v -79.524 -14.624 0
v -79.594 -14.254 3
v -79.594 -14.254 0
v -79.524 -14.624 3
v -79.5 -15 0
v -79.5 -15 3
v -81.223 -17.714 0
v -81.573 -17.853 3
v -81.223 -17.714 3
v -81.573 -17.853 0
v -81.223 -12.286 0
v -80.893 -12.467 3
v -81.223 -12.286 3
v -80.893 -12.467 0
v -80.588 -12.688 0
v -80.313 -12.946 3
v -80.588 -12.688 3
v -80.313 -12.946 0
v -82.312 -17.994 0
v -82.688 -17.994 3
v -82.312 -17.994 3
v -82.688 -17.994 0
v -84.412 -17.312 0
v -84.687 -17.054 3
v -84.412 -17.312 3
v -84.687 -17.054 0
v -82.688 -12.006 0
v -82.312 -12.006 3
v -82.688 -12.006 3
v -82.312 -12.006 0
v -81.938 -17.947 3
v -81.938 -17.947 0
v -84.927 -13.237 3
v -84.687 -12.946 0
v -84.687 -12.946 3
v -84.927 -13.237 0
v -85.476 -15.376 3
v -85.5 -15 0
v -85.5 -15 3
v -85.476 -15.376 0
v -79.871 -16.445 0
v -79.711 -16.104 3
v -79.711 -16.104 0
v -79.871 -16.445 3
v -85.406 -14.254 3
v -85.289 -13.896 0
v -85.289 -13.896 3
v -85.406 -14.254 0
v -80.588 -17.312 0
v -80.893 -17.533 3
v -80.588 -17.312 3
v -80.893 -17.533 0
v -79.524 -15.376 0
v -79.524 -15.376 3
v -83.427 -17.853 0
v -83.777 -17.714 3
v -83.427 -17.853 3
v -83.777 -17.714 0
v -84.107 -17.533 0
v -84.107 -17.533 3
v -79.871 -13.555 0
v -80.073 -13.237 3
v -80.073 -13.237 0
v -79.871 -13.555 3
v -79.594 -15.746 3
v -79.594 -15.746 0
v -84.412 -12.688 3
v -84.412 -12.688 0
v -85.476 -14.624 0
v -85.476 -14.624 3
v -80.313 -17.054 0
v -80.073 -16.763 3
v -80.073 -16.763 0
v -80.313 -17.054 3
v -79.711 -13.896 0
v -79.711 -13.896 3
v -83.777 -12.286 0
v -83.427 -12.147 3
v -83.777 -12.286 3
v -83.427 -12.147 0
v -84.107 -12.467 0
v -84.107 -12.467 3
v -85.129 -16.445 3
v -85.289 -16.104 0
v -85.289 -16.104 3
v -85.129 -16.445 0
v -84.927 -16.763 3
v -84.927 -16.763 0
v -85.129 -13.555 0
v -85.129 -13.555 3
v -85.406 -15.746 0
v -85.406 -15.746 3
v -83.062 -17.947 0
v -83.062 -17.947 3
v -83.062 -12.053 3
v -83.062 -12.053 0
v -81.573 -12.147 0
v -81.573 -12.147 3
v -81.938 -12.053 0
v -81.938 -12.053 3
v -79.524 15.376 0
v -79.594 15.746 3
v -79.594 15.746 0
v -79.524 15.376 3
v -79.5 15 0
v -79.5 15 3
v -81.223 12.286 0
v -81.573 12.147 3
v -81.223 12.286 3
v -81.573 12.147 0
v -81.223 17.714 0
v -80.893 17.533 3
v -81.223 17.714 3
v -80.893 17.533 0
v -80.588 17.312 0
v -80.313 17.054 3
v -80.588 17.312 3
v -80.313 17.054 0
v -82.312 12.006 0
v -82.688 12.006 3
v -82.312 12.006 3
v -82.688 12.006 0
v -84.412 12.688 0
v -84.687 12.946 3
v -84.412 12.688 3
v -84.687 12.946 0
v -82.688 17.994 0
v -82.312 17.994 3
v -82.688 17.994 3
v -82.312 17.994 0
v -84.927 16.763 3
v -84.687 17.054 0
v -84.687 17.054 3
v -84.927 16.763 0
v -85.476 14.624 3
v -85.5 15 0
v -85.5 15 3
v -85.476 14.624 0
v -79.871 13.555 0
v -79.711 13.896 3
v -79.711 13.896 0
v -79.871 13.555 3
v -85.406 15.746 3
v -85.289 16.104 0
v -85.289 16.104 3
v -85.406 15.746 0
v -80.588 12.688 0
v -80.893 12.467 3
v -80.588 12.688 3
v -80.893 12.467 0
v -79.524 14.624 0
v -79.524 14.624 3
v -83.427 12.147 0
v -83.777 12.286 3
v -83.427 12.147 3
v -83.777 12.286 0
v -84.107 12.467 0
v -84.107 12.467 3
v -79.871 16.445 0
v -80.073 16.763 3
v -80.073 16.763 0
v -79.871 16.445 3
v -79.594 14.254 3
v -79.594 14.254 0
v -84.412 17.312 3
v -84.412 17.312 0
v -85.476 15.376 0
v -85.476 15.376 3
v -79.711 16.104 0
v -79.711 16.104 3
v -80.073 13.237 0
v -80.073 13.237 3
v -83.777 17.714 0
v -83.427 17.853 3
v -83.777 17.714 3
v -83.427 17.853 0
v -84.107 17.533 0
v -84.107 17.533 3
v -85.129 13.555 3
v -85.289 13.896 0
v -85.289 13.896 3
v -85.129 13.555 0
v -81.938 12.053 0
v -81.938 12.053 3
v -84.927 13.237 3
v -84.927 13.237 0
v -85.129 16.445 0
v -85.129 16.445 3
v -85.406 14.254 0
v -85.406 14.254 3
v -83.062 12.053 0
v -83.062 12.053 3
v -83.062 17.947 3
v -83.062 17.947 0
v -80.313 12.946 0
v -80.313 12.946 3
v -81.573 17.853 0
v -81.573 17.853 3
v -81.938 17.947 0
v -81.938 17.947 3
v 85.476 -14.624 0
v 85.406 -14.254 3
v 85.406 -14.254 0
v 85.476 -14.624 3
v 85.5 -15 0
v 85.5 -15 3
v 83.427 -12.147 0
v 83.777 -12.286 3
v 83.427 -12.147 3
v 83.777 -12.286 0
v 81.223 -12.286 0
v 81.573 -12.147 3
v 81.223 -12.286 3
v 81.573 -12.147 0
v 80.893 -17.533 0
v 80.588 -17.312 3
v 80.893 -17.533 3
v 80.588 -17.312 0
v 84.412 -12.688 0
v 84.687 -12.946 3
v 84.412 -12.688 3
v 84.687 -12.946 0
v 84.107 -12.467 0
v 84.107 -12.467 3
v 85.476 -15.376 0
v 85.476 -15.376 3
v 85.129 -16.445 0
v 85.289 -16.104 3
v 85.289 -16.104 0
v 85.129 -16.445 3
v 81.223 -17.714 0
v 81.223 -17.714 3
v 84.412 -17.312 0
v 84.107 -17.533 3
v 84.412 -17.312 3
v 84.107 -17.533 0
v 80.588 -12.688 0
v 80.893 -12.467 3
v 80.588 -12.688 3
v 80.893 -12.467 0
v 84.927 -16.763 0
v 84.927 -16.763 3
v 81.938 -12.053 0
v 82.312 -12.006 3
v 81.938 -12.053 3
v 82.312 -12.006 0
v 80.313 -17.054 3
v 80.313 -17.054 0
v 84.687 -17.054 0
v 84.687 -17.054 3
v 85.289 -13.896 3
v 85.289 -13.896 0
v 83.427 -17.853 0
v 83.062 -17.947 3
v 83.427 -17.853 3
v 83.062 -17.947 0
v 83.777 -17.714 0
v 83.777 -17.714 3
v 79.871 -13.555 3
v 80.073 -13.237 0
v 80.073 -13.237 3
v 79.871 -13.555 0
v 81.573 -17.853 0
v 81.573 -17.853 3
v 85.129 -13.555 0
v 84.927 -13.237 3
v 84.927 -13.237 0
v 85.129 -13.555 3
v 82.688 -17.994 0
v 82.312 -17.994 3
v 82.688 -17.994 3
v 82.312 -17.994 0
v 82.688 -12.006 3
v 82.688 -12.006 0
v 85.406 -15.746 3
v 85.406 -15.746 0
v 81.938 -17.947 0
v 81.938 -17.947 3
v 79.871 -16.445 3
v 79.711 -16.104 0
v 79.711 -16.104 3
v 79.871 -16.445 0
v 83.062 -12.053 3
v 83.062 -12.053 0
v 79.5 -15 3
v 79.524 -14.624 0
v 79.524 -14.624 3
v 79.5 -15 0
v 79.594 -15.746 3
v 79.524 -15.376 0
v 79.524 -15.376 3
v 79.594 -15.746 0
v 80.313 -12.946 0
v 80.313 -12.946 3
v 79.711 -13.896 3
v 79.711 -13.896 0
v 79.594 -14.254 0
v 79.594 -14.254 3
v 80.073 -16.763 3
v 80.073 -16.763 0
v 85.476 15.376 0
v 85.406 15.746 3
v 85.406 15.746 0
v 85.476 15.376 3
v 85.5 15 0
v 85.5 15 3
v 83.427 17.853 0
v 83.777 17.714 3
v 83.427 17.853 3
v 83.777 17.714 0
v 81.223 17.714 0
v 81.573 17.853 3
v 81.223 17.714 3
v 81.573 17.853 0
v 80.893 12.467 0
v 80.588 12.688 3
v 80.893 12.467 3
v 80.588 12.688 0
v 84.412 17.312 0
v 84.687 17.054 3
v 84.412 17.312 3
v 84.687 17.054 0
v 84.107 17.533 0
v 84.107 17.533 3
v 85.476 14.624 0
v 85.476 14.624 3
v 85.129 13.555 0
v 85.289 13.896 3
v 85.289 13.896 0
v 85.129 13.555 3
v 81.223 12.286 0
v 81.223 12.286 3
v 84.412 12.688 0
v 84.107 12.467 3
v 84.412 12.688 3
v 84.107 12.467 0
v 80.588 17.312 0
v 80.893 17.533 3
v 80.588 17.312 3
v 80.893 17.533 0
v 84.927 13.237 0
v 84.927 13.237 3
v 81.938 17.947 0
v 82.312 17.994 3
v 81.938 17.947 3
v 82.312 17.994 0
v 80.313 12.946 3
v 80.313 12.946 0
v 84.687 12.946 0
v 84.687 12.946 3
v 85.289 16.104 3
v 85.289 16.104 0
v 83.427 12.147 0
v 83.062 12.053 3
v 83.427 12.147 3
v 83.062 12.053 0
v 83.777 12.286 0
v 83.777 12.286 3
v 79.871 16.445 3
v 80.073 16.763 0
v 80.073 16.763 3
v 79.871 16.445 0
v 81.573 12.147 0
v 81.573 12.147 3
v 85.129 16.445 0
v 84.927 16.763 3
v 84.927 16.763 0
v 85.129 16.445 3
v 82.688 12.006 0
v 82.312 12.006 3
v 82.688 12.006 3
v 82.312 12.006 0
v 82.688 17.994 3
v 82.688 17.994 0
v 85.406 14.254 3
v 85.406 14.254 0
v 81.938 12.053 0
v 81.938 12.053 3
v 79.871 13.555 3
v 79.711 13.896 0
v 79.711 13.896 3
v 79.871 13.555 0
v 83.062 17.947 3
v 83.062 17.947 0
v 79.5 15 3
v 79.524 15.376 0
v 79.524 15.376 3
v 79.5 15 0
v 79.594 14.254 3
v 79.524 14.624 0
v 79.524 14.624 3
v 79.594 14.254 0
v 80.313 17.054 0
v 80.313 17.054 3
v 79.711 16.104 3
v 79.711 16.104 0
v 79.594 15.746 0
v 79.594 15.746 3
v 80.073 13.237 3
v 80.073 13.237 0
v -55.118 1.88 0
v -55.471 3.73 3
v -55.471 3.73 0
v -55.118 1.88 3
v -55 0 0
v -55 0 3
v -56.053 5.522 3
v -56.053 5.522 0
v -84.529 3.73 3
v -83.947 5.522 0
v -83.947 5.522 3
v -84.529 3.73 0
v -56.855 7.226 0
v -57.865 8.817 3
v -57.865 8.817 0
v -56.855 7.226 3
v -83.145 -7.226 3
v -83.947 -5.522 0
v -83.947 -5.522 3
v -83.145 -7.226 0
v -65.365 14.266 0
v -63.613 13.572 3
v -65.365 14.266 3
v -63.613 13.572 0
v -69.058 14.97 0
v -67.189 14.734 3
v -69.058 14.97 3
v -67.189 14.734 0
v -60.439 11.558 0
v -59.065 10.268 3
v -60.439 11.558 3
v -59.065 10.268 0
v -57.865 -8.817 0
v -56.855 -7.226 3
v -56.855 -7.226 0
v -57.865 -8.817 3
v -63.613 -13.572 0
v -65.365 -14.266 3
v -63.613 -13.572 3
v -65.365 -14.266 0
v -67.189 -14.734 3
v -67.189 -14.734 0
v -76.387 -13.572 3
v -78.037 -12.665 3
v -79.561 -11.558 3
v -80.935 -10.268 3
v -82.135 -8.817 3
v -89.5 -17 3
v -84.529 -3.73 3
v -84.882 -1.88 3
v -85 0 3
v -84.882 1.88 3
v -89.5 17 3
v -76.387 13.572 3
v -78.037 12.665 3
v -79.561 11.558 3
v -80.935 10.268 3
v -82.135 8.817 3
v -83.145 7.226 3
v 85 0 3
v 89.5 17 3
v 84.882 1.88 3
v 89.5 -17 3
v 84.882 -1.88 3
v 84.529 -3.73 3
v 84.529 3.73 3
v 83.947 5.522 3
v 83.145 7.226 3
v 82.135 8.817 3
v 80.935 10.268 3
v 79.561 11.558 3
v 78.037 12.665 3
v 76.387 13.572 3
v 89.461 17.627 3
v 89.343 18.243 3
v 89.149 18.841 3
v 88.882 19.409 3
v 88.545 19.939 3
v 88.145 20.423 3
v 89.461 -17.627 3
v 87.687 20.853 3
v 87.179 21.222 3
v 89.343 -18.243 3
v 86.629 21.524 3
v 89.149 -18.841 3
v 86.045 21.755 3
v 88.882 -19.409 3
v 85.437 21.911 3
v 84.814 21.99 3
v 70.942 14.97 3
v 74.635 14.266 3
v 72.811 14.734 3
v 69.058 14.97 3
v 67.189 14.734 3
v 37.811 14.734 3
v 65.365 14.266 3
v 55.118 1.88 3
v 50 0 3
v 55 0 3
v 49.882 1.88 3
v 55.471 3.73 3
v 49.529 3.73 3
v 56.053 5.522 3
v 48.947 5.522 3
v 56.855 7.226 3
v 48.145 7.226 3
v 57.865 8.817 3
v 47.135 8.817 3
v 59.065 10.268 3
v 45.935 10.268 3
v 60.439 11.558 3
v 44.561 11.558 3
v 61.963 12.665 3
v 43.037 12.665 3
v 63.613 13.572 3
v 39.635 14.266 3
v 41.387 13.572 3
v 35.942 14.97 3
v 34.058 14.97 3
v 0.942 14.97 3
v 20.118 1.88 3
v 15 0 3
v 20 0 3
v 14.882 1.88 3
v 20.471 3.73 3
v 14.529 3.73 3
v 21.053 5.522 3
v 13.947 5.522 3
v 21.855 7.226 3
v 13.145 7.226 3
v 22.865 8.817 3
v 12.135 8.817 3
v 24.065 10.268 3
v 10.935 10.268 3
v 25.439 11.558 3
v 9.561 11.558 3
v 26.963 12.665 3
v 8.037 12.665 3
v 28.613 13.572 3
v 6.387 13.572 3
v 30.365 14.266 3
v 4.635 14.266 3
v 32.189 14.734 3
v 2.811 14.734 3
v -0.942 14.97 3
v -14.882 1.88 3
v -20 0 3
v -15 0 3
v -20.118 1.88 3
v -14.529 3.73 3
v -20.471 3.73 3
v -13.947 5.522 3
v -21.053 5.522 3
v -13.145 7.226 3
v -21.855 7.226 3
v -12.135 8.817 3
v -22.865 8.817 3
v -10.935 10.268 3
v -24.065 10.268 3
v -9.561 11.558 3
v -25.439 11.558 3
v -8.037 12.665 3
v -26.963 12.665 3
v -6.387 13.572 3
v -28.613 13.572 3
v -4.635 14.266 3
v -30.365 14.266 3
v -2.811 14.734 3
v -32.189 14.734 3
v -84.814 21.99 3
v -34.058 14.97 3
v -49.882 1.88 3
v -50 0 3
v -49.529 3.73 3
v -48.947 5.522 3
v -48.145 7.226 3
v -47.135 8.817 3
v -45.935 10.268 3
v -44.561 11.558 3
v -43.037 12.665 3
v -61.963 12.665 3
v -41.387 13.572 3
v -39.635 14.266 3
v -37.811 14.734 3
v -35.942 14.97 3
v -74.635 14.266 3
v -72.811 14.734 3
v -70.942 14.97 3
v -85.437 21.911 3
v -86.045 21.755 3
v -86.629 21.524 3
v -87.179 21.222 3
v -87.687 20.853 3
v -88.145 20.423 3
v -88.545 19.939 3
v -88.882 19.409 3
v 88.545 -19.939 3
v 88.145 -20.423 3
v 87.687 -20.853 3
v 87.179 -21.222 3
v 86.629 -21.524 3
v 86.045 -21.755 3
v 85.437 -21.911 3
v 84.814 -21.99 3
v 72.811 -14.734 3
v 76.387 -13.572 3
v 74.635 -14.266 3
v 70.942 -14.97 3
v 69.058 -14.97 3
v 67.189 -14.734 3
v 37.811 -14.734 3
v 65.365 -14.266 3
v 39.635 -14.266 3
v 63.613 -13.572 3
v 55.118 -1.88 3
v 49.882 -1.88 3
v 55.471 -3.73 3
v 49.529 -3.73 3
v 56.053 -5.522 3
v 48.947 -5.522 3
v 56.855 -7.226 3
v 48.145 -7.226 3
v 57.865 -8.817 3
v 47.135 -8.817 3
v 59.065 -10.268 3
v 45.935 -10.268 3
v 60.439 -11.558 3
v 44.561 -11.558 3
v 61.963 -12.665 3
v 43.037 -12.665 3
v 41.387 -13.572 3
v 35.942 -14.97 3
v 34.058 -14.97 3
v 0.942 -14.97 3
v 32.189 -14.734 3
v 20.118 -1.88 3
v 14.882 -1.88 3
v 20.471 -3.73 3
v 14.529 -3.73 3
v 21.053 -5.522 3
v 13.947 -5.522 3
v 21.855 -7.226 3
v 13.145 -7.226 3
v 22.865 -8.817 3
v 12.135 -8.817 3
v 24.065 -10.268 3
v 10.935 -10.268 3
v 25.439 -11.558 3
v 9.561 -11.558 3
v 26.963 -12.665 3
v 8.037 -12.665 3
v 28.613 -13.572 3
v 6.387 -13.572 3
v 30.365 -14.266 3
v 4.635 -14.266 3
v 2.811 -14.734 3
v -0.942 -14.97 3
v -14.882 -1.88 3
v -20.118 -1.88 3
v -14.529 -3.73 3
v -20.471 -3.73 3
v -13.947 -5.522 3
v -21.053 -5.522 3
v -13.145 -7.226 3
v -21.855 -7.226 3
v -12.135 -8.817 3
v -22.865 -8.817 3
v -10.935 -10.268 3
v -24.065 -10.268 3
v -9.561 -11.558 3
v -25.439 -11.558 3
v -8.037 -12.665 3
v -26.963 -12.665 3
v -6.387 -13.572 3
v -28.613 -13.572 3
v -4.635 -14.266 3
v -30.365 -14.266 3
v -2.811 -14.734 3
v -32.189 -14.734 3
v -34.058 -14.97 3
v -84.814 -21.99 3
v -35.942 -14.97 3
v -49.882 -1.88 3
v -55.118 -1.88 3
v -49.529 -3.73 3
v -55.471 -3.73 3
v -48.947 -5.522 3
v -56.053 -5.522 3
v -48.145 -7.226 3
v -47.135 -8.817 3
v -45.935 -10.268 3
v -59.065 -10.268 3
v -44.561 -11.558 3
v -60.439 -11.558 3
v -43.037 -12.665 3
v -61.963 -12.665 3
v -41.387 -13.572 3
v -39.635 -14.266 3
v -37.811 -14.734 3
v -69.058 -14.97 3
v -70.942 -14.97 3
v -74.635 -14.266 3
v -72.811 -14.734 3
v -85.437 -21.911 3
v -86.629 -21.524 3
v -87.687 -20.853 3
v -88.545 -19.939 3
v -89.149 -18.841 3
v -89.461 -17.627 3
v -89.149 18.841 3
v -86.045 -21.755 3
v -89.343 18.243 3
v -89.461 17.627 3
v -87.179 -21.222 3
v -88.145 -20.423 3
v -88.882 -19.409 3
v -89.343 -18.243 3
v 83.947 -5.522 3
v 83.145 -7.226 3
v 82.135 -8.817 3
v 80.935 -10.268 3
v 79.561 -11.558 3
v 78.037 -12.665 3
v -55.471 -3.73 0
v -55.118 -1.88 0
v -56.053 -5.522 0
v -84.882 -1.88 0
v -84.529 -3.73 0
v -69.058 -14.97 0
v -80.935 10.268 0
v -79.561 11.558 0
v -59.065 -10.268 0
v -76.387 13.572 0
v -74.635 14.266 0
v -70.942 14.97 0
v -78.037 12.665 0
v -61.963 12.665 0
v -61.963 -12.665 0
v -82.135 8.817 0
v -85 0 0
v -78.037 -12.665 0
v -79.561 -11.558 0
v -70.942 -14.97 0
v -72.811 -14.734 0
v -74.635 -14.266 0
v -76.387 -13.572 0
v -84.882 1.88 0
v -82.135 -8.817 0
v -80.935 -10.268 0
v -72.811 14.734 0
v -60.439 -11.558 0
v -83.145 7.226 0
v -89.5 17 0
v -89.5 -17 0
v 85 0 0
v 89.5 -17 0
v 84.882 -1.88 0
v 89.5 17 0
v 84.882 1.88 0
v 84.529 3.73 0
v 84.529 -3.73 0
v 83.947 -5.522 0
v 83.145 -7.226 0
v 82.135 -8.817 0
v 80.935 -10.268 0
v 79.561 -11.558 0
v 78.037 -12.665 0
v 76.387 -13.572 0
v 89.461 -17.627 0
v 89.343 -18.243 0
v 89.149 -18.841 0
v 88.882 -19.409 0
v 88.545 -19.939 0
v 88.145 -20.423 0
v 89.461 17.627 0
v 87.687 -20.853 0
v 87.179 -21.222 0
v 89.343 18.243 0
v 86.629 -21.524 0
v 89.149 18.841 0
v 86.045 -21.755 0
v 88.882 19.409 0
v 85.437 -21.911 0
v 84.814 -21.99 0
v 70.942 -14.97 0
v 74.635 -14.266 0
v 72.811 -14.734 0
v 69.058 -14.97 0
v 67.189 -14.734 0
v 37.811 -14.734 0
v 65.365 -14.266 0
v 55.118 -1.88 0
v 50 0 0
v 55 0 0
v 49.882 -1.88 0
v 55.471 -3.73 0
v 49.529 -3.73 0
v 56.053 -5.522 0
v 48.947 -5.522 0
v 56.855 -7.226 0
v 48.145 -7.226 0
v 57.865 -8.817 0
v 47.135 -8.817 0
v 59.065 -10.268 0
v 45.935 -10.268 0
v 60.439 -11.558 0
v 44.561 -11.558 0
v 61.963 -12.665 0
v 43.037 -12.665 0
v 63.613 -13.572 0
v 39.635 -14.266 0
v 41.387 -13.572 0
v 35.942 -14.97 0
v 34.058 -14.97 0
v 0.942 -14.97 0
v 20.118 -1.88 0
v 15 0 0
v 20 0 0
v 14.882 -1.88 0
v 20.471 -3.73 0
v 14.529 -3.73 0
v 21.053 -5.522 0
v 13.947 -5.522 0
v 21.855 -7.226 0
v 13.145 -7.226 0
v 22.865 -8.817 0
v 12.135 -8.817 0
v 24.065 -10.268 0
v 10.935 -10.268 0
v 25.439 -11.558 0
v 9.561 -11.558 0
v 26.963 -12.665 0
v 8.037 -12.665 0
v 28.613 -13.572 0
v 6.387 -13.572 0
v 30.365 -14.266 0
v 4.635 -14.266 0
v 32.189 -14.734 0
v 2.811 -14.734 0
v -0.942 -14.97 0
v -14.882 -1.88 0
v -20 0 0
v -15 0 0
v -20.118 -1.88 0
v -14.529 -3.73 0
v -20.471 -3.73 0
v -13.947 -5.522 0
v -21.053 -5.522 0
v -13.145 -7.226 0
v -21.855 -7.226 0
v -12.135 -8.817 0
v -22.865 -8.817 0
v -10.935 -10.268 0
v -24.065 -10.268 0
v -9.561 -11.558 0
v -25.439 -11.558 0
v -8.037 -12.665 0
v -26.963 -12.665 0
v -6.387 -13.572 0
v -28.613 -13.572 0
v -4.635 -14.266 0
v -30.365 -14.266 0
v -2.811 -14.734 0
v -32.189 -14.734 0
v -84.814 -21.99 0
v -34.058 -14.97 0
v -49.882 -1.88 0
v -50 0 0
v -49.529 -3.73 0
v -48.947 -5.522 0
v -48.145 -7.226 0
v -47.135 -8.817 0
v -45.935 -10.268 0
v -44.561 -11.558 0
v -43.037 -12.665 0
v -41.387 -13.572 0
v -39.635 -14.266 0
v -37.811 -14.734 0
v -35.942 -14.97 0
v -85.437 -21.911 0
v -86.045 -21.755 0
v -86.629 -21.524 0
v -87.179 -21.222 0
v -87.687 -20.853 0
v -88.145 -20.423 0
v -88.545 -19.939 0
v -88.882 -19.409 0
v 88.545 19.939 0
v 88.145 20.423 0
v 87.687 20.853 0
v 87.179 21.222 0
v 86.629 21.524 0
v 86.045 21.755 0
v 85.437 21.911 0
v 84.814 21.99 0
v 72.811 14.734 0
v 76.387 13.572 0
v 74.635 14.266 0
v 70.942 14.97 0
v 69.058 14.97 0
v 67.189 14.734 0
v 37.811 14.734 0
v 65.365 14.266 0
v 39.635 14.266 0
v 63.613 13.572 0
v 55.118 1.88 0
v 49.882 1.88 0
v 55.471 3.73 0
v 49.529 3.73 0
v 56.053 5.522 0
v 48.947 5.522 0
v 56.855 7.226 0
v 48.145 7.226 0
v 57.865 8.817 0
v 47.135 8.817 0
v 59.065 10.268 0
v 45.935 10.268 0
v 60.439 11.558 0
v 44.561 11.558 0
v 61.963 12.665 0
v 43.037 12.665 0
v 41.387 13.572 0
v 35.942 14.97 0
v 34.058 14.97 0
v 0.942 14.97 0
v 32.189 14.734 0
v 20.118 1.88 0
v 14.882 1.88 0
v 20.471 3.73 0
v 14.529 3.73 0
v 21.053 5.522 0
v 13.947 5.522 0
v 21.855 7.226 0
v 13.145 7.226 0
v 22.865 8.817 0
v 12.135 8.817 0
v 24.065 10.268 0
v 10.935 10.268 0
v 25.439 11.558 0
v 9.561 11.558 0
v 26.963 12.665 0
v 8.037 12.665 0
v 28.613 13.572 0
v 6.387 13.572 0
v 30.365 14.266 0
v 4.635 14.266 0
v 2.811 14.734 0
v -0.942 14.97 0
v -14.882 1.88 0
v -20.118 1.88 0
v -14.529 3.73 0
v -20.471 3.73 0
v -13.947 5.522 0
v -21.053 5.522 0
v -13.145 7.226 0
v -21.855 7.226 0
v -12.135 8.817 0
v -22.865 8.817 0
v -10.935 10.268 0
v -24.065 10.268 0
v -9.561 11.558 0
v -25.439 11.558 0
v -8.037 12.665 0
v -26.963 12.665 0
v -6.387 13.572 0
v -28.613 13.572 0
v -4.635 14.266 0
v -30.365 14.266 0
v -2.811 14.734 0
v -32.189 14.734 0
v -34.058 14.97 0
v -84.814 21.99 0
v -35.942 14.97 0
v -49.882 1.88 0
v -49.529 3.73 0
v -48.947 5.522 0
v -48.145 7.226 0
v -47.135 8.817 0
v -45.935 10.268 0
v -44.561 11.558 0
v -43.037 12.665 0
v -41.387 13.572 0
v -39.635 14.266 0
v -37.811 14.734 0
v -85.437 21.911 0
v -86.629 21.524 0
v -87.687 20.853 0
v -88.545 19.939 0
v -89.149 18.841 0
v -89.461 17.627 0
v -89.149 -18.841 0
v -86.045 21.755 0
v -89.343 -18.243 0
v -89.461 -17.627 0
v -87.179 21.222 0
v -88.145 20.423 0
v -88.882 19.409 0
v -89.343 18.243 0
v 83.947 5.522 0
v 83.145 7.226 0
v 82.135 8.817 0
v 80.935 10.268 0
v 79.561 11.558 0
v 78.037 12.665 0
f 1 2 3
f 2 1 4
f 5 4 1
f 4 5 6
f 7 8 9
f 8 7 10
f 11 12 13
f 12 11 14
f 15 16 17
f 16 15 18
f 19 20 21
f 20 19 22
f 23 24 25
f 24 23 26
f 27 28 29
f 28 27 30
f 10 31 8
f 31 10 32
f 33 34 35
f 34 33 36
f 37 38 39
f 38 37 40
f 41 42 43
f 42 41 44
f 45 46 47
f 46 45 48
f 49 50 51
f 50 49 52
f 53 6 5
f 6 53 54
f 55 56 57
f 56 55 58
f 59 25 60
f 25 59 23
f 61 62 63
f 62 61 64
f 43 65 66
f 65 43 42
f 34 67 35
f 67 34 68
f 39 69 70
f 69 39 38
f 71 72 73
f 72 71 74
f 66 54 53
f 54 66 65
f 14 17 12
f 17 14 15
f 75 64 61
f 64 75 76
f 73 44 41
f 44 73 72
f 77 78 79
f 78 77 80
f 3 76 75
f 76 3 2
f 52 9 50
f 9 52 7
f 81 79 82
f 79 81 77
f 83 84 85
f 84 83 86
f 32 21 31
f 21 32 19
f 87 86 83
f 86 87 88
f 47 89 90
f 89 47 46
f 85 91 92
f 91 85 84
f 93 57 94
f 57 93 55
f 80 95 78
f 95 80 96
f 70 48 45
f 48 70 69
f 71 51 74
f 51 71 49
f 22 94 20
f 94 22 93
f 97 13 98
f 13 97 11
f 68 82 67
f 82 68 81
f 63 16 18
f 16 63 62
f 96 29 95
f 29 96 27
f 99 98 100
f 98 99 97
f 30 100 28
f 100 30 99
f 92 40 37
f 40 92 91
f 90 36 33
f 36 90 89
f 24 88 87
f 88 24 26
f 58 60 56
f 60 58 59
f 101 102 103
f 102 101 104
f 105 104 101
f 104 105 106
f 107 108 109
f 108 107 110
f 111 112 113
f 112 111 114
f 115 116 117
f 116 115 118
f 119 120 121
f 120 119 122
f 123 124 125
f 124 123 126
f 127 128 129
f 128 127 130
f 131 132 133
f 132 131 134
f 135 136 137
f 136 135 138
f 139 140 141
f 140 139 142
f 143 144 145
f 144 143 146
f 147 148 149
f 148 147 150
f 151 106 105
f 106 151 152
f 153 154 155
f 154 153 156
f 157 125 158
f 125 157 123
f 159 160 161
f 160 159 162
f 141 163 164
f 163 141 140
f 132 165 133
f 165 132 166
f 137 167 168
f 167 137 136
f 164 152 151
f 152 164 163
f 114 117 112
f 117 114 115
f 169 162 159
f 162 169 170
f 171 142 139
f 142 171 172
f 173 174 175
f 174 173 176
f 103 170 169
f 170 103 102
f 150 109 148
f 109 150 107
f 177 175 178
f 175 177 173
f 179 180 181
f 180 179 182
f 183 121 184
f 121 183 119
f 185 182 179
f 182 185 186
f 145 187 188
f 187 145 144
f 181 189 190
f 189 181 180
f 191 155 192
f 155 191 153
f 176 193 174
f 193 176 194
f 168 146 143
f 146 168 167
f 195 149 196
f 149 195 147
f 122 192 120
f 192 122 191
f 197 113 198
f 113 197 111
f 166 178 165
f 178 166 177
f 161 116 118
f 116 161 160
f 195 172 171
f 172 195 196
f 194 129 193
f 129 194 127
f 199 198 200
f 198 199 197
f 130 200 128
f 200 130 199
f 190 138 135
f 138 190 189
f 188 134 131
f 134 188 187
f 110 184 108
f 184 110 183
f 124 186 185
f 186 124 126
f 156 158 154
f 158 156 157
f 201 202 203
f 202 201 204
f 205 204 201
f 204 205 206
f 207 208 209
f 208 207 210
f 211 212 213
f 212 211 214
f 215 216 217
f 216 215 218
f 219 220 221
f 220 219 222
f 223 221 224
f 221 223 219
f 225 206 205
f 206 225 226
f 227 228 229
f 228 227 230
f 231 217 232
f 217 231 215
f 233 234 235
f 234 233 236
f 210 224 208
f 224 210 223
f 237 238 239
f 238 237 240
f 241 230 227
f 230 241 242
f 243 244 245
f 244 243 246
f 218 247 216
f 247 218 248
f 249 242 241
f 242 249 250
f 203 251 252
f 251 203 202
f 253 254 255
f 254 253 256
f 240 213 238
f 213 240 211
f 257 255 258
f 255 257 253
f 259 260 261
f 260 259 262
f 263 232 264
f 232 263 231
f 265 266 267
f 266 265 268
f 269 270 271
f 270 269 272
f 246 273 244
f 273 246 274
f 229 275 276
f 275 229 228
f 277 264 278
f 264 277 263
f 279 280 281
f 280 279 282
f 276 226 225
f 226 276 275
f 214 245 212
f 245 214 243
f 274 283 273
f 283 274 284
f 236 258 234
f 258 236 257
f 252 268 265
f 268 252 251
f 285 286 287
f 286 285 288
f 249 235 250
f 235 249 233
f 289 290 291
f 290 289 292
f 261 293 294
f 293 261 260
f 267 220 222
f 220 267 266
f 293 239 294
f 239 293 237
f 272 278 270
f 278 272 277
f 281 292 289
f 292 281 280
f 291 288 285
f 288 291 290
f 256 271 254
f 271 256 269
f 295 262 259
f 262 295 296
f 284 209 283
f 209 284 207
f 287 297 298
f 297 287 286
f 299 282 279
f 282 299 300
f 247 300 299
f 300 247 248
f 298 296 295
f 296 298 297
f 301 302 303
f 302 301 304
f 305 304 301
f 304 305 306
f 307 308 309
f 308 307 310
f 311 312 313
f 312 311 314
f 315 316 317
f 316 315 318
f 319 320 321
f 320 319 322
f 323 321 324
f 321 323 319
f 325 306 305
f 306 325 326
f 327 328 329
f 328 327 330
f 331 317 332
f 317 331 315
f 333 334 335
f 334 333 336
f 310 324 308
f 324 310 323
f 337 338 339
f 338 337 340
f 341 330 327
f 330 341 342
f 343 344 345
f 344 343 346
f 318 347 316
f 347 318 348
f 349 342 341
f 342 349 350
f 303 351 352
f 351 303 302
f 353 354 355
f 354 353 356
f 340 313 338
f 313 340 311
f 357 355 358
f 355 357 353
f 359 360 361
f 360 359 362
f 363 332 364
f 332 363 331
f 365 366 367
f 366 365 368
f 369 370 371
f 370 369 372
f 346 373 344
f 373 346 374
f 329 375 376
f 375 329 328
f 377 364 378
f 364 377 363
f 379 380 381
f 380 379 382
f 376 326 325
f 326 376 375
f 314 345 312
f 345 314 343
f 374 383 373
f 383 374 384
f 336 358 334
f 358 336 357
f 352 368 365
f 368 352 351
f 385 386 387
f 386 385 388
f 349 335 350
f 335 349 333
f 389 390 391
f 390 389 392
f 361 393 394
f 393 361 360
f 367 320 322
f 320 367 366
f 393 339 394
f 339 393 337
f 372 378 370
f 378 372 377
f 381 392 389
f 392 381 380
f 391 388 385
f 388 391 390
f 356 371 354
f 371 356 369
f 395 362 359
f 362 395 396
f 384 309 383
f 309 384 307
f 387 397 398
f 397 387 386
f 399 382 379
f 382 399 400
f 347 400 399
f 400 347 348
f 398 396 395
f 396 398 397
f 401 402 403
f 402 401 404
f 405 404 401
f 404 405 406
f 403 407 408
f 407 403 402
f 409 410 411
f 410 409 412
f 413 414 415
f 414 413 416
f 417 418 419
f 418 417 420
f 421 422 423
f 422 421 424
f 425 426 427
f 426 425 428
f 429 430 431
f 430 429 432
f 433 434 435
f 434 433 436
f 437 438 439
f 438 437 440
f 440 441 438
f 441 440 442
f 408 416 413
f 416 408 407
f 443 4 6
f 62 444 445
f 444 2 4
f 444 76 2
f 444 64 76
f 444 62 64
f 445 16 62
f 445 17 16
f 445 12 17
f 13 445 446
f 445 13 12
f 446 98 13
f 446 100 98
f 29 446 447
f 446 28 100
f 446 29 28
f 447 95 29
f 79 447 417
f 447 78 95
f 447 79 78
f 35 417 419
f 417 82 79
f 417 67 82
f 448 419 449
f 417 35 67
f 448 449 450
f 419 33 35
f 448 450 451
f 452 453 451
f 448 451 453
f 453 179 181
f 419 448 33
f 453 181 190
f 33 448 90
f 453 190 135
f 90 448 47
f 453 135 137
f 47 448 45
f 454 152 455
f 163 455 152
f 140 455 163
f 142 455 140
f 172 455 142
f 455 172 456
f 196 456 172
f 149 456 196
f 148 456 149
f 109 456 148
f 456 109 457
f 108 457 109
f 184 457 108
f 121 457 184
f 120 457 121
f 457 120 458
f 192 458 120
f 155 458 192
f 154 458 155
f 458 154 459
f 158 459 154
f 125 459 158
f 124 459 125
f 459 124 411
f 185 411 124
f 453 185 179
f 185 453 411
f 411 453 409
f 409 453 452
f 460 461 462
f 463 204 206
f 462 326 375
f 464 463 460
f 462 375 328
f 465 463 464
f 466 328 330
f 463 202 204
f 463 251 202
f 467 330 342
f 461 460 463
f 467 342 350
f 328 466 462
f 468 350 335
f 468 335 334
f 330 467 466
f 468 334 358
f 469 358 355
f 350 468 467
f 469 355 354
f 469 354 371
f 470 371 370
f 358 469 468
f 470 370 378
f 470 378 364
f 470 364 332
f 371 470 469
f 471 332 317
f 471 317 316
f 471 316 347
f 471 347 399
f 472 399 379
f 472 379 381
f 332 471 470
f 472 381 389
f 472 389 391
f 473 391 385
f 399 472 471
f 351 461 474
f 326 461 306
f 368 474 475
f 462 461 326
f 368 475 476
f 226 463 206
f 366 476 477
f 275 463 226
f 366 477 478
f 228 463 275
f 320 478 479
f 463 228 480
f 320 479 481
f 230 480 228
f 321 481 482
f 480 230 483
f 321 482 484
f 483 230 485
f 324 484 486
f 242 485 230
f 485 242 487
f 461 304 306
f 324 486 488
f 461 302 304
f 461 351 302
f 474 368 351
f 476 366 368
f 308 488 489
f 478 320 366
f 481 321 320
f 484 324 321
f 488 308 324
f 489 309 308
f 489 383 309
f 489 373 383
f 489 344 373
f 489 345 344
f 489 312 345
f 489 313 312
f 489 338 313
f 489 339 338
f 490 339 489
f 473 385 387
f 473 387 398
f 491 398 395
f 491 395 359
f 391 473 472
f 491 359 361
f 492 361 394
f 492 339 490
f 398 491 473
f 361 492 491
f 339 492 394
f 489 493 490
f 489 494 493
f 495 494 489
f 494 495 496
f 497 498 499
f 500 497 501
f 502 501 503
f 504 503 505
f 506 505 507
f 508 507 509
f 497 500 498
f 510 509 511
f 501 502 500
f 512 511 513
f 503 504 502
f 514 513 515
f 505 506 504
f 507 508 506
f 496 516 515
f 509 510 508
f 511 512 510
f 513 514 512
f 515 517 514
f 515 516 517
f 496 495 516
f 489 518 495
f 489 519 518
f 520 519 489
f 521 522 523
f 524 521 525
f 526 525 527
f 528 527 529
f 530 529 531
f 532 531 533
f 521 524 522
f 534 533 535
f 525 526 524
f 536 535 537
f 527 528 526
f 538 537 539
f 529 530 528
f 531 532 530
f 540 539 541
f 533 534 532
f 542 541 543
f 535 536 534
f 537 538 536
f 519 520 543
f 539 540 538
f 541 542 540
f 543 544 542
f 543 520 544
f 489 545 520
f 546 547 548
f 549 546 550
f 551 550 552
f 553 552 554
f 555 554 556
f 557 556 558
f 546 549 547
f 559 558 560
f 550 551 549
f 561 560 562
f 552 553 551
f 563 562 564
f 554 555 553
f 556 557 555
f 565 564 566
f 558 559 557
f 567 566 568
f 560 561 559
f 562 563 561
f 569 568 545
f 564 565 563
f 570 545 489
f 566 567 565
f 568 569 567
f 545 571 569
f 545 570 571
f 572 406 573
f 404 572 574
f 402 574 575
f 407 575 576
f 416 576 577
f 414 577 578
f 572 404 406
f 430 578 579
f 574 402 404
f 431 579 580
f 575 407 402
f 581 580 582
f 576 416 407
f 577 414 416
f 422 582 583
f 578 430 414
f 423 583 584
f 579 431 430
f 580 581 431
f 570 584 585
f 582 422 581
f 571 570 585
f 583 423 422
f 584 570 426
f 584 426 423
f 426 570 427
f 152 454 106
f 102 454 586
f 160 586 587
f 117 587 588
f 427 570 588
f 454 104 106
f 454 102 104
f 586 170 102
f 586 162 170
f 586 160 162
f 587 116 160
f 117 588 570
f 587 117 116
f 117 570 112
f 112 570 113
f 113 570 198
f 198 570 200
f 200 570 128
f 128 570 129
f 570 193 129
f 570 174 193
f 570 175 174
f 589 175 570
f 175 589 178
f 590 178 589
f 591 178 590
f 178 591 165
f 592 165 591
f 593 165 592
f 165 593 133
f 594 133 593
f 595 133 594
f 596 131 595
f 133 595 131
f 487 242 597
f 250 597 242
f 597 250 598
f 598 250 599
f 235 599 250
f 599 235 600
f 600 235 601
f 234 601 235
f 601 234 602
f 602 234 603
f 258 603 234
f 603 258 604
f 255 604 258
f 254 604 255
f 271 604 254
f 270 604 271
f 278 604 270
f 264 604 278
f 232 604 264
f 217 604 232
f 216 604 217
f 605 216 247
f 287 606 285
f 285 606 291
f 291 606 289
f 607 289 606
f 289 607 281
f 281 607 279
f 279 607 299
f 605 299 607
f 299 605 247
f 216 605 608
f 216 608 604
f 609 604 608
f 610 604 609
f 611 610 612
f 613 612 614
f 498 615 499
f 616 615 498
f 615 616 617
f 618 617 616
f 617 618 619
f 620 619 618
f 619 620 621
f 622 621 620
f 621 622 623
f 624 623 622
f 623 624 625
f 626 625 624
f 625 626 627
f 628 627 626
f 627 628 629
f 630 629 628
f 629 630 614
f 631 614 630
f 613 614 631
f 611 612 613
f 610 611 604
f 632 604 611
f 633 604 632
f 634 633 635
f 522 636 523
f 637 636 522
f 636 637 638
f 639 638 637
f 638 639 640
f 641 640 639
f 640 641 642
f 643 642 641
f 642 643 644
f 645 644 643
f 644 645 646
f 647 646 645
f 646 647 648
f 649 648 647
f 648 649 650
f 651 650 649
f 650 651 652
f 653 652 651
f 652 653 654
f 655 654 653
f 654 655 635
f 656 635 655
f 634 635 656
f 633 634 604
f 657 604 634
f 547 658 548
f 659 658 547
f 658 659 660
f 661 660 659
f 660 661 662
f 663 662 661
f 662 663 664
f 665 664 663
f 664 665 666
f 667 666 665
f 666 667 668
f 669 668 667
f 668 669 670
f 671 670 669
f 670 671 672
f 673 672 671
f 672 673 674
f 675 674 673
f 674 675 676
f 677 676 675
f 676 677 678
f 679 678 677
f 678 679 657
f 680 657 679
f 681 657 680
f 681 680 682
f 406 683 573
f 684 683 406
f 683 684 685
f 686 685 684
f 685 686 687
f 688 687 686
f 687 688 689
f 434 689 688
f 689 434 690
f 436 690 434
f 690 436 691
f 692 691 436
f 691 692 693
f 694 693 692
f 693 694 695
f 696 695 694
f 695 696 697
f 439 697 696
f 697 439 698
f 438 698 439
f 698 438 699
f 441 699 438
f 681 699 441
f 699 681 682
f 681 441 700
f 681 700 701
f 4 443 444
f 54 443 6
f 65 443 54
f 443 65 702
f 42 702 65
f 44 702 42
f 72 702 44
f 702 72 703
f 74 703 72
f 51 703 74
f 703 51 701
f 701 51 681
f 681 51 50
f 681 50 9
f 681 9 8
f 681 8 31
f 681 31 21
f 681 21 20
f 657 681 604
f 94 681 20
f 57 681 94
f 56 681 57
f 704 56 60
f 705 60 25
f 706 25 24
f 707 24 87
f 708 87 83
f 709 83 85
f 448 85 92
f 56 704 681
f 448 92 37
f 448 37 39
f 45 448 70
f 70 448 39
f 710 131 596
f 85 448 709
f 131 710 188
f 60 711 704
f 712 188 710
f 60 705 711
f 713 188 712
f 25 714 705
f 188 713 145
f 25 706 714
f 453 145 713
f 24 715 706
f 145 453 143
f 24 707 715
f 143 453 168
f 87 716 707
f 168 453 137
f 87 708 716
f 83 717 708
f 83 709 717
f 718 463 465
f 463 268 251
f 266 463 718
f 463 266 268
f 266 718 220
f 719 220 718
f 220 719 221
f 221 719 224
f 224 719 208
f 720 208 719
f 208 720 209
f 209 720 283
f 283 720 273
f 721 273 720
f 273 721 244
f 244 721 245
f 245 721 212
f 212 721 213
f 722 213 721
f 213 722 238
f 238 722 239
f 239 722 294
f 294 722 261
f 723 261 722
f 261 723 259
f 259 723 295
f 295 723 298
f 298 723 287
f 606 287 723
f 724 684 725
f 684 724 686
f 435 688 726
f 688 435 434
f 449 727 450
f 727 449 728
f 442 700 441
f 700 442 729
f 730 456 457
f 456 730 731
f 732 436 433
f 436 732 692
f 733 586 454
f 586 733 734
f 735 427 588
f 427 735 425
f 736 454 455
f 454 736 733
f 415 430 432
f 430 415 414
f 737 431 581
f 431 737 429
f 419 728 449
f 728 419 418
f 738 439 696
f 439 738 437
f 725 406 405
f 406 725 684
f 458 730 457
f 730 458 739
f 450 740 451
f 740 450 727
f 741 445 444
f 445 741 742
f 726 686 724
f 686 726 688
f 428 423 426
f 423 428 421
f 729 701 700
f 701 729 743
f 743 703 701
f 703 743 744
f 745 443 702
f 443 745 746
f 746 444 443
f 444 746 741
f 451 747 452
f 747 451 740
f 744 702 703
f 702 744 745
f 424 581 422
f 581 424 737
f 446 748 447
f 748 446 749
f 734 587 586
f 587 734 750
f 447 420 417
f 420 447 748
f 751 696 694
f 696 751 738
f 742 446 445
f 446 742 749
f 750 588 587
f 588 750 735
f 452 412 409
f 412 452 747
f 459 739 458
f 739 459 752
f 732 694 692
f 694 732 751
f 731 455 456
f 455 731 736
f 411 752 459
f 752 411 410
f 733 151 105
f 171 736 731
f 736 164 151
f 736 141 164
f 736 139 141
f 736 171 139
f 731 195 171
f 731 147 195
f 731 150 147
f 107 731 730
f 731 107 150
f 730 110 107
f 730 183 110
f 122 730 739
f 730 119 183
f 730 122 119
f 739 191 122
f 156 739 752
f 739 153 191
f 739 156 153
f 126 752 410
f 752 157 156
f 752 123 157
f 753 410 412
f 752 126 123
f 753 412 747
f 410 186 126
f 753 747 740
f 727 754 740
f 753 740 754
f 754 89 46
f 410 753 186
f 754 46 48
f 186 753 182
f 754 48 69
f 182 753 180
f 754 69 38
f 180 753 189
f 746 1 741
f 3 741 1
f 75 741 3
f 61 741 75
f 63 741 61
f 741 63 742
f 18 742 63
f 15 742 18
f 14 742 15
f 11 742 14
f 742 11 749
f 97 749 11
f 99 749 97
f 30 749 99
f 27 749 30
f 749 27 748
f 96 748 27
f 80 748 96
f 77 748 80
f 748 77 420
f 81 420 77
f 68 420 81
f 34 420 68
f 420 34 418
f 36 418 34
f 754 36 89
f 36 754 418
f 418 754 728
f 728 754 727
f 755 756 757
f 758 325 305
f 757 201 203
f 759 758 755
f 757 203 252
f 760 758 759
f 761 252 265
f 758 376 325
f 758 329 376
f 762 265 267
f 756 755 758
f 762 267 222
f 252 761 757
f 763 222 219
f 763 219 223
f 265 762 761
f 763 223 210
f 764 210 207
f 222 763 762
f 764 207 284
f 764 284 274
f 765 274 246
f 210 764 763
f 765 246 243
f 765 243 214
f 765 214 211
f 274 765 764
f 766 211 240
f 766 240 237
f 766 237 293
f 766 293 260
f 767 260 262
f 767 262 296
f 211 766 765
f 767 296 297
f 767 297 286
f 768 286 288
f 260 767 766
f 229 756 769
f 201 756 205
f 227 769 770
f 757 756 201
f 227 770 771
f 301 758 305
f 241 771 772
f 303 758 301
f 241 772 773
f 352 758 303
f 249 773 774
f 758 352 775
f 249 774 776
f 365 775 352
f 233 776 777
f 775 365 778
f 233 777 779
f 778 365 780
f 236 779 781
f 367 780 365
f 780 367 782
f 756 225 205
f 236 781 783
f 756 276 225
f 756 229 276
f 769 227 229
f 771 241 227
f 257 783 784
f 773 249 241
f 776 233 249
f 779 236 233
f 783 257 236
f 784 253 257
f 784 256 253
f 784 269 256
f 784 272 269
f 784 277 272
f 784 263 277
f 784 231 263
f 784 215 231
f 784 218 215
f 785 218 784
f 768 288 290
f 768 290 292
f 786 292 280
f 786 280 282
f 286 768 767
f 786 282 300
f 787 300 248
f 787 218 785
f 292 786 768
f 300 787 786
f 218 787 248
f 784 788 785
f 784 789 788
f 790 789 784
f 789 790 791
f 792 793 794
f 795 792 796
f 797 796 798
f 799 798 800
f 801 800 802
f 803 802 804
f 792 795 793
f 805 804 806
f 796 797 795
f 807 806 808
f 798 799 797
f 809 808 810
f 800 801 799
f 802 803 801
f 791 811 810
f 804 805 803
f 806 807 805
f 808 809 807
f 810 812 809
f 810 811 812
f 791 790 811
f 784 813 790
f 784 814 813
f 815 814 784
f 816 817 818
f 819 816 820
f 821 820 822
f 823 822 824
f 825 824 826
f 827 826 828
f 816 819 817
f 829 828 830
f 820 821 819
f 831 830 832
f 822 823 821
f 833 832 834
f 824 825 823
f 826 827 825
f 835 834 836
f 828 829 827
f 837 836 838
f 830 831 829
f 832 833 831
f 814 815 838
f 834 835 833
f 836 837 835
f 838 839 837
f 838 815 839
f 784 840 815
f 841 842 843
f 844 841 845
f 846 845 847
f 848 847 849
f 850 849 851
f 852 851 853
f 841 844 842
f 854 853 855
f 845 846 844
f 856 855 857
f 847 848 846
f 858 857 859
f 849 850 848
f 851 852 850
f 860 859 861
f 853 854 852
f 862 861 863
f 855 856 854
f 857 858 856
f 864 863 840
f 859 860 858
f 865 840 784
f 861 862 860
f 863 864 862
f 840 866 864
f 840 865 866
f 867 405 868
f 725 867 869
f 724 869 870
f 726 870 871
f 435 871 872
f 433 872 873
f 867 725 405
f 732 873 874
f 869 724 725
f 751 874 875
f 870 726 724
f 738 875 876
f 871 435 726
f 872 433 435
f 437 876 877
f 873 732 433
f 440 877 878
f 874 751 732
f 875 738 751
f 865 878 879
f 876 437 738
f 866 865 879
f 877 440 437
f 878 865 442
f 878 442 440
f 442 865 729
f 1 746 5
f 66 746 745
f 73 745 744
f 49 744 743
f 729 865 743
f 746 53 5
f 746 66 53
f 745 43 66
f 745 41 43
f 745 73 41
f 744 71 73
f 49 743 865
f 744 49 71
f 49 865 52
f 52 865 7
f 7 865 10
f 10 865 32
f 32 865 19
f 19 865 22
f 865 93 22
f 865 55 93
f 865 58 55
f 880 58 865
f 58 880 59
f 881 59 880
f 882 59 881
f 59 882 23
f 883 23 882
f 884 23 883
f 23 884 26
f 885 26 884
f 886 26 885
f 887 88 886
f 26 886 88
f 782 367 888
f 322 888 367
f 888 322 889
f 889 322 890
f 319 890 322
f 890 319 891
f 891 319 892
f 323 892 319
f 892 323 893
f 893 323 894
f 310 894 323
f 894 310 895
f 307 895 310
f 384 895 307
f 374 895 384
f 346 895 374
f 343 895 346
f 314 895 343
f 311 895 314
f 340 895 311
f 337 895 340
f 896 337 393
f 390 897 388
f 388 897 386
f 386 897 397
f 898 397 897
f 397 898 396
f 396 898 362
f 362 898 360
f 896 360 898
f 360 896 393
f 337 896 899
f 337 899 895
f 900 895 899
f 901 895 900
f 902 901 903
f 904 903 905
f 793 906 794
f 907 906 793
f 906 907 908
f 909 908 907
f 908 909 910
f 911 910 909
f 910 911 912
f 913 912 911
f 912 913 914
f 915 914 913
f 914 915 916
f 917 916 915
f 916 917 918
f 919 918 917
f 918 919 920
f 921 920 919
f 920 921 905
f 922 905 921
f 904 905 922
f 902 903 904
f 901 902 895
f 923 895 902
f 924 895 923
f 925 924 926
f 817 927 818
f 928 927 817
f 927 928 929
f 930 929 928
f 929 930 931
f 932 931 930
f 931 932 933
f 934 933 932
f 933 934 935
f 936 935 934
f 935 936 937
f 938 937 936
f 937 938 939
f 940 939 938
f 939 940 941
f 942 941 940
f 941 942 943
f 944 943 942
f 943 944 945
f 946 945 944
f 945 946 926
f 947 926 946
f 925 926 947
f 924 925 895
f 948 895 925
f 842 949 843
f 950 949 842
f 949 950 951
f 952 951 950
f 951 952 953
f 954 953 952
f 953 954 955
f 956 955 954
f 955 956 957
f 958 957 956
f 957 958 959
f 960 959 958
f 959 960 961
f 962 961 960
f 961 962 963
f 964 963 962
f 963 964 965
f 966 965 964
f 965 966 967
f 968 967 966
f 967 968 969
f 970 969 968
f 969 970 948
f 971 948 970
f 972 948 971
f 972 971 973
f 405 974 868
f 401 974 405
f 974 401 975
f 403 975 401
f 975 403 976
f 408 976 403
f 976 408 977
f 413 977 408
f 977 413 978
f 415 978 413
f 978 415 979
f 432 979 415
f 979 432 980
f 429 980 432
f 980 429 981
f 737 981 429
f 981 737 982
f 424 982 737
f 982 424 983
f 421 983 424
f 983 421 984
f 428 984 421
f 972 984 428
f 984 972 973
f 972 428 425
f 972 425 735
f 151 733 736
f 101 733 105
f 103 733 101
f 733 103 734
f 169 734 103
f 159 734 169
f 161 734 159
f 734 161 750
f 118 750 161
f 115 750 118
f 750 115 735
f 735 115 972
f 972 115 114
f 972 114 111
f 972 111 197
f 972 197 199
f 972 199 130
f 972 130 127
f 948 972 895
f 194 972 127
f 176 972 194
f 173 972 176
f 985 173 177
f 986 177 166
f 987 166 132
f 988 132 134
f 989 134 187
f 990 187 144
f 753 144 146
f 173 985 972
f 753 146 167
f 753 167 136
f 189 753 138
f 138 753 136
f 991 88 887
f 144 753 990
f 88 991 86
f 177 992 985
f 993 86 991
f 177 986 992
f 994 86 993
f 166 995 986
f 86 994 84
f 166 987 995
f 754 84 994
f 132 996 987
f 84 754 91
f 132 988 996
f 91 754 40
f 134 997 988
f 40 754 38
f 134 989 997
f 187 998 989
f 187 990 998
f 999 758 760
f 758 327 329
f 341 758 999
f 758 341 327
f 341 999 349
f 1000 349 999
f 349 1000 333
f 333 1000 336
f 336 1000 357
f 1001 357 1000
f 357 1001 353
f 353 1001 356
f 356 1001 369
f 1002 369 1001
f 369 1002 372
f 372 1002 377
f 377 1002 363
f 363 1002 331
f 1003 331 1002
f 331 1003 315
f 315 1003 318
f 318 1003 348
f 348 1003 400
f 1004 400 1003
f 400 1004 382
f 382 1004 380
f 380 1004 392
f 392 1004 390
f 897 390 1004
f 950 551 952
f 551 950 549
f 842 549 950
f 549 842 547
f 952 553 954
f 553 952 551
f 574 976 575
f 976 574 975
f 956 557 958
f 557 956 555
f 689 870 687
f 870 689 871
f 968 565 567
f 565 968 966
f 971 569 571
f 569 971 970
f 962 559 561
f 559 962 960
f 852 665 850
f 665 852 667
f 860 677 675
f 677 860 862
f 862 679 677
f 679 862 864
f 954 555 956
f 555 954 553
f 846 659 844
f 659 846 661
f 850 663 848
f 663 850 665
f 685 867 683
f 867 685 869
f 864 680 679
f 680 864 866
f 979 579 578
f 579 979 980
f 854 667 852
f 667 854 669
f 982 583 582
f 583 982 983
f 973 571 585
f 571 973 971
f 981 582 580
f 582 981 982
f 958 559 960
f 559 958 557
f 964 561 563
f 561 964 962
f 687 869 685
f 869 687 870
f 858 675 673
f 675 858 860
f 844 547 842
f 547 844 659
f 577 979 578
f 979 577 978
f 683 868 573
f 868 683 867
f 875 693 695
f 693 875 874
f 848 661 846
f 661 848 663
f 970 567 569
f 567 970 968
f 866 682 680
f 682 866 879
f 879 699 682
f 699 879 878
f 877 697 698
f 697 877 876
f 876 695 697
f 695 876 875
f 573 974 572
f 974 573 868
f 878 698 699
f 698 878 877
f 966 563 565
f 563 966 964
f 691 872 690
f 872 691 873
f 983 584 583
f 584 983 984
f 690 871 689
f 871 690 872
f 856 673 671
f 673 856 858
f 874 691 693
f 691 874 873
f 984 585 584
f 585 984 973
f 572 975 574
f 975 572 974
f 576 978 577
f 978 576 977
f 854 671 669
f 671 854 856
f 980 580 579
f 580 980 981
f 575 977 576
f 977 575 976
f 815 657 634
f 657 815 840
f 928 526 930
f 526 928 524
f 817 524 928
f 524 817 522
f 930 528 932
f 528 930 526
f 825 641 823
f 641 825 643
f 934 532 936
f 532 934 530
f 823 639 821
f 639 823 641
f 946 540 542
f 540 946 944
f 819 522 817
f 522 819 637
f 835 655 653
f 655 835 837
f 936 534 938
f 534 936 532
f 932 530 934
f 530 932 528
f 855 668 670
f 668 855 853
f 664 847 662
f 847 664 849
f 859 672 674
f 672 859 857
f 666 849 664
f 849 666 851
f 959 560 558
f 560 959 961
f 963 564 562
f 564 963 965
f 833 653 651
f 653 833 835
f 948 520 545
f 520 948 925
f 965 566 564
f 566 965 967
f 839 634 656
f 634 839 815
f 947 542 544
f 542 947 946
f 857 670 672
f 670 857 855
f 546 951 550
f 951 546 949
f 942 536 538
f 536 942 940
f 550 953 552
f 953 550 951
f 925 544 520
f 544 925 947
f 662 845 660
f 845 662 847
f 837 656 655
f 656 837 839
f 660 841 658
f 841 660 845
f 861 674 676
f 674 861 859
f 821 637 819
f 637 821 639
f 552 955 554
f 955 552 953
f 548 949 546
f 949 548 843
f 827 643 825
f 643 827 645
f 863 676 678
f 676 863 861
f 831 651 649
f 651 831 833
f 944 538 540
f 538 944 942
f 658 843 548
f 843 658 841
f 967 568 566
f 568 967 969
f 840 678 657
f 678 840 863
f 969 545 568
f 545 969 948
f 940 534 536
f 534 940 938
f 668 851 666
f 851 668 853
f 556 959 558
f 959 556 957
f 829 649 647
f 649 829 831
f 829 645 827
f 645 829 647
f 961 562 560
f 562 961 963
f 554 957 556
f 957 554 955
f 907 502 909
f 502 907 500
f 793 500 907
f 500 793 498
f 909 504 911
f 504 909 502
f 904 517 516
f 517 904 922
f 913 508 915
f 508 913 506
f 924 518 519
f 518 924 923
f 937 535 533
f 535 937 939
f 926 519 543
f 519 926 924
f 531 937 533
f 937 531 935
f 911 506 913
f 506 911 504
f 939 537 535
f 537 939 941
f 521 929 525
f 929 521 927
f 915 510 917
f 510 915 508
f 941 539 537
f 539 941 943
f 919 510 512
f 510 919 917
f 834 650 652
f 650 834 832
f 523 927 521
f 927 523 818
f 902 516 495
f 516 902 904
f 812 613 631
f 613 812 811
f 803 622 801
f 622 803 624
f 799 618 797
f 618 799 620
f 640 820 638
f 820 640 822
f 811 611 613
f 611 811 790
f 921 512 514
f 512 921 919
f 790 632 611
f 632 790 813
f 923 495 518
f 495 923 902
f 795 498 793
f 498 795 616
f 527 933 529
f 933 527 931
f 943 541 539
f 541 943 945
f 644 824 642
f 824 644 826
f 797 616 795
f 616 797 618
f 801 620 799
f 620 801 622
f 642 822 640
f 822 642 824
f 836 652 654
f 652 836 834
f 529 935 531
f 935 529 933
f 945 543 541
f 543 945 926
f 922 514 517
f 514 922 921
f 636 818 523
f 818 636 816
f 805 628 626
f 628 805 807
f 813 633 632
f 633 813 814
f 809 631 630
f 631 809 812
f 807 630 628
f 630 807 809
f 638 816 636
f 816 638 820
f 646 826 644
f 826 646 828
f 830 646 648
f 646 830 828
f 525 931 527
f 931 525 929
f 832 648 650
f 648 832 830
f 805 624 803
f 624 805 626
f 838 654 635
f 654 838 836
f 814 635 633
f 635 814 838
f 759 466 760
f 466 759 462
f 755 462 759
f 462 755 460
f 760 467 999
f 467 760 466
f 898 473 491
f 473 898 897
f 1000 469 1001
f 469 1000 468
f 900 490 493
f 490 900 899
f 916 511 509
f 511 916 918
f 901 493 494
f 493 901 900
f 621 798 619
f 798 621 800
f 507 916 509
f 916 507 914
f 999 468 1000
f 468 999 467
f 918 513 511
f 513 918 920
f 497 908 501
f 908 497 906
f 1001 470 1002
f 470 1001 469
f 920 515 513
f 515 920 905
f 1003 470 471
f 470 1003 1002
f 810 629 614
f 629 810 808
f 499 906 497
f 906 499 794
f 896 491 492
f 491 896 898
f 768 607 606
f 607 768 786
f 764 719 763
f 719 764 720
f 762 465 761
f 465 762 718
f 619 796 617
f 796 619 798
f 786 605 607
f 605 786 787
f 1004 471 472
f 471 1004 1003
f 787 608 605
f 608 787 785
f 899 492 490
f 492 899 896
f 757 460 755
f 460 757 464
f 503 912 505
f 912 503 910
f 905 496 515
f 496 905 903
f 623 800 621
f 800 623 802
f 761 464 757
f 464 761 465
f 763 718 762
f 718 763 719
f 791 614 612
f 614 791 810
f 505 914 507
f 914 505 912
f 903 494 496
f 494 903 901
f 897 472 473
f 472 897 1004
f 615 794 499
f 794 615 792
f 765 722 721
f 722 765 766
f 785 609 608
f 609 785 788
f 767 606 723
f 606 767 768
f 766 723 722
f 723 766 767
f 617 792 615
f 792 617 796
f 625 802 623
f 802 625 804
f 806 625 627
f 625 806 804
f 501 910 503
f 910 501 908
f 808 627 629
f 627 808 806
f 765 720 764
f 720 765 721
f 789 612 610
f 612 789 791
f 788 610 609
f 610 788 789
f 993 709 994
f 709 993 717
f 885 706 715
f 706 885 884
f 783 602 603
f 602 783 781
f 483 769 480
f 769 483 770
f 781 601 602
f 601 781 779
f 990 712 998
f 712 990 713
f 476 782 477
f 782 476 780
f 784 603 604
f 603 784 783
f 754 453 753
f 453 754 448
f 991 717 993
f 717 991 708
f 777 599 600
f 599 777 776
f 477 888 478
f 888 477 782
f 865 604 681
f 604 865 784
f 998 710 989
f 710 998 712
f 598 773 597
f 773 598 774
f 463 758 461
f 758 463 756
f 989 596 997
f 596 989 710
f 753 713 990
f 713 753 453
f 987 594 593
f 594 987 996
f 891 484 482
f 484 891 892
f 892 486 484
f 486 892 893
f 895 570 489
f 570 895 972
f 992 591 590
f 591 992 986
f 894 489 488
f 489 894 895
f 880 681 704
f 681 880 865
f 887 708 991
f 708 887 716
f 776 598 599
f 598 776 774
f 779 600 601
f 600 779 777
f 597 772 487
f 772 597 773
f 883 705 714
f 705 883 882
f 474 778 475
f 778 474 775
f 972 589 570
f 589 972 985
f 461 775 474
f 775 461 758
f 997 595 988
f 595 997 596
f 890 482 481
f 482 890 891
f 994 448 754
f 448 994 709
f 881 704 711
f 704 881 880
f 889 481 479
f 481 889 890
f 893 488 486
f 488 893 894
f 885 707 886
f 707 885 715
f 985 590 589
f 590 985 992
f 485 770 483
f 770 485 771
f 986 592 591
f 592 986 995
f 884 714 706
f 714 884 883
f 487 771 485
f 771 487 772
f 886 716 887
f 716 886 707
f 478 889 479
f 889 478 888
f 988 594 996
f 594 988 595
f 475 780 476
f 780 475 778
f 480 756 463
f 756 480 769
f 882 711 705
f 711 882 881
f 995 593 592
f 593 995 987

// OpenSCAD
$fn = 50;

difference() {
	union() {
		hull() {
			translate(v = [-84.5, 17.0, 0]) {
				cylinder(h = 3, r = 5);
			}
			translate(v = [84.5, 17.0, 0]) {
				cylinder(h = 3, r = 5);
			}
			translate(v = [-84.5, -17.0, 0]) {
				cylinder(h = 3, r = 5);
			}
			translate(v = [84.5, -17.0, 0]) {
				cylinder(h = 3, r = 5);
			}
		}
	}
	union() {
		translate(v = [-82.5, -15.0, -100.0]) {
			cylinder(h = 200, r = 3.0);
		}
		translate(v = [-82.5, 15.0, -100.0]) {
			cylinder(h = 200, r = 3.0);
		}
		translate(v = [82.5, -15.0, -100.0]) {
			cylinder(h = 200, r = 3.0);
		}
		translate(v = [82.5, 15.0, -100.0]) {
			cylinder(h = 200, r = 3.0);
		}
		translate(v = [-82.5, -15.0, -100.0]) {
			cylinder(h = 200, r = 1.5);
		}
		translate(v = [-82.5, 15.0, -100.0]) {
			cylinder(h = 200, r = 1.5);
		}
		translate(v = [82.5, -15.0, -100.0]) {
			cylinder(h = 200, r = 1.5);
		}
		translate(v = [82.5, 15.0, -100.0]) {
			cylinder(h = 200, r = 1.5);
		}
		translate(v = [-70.0, 0, 0.0]) {
			cylinder(h = 3, r = 15.0);
		}
		translate(v = [-35.0, 0, 0.0]) {
			cylinder(h = 3, r = 15.0);
		}
		cylinder(h = 3, r = 15.0);
		translate(v = [35.0, 0, 0.0]) {
			cylinder(h = 3, r = 15.0);
		}
		translate(v = [70.0, 0, 0.0]) {
			cylinder(h = 3, r = 15.0);
		}
	}
}
